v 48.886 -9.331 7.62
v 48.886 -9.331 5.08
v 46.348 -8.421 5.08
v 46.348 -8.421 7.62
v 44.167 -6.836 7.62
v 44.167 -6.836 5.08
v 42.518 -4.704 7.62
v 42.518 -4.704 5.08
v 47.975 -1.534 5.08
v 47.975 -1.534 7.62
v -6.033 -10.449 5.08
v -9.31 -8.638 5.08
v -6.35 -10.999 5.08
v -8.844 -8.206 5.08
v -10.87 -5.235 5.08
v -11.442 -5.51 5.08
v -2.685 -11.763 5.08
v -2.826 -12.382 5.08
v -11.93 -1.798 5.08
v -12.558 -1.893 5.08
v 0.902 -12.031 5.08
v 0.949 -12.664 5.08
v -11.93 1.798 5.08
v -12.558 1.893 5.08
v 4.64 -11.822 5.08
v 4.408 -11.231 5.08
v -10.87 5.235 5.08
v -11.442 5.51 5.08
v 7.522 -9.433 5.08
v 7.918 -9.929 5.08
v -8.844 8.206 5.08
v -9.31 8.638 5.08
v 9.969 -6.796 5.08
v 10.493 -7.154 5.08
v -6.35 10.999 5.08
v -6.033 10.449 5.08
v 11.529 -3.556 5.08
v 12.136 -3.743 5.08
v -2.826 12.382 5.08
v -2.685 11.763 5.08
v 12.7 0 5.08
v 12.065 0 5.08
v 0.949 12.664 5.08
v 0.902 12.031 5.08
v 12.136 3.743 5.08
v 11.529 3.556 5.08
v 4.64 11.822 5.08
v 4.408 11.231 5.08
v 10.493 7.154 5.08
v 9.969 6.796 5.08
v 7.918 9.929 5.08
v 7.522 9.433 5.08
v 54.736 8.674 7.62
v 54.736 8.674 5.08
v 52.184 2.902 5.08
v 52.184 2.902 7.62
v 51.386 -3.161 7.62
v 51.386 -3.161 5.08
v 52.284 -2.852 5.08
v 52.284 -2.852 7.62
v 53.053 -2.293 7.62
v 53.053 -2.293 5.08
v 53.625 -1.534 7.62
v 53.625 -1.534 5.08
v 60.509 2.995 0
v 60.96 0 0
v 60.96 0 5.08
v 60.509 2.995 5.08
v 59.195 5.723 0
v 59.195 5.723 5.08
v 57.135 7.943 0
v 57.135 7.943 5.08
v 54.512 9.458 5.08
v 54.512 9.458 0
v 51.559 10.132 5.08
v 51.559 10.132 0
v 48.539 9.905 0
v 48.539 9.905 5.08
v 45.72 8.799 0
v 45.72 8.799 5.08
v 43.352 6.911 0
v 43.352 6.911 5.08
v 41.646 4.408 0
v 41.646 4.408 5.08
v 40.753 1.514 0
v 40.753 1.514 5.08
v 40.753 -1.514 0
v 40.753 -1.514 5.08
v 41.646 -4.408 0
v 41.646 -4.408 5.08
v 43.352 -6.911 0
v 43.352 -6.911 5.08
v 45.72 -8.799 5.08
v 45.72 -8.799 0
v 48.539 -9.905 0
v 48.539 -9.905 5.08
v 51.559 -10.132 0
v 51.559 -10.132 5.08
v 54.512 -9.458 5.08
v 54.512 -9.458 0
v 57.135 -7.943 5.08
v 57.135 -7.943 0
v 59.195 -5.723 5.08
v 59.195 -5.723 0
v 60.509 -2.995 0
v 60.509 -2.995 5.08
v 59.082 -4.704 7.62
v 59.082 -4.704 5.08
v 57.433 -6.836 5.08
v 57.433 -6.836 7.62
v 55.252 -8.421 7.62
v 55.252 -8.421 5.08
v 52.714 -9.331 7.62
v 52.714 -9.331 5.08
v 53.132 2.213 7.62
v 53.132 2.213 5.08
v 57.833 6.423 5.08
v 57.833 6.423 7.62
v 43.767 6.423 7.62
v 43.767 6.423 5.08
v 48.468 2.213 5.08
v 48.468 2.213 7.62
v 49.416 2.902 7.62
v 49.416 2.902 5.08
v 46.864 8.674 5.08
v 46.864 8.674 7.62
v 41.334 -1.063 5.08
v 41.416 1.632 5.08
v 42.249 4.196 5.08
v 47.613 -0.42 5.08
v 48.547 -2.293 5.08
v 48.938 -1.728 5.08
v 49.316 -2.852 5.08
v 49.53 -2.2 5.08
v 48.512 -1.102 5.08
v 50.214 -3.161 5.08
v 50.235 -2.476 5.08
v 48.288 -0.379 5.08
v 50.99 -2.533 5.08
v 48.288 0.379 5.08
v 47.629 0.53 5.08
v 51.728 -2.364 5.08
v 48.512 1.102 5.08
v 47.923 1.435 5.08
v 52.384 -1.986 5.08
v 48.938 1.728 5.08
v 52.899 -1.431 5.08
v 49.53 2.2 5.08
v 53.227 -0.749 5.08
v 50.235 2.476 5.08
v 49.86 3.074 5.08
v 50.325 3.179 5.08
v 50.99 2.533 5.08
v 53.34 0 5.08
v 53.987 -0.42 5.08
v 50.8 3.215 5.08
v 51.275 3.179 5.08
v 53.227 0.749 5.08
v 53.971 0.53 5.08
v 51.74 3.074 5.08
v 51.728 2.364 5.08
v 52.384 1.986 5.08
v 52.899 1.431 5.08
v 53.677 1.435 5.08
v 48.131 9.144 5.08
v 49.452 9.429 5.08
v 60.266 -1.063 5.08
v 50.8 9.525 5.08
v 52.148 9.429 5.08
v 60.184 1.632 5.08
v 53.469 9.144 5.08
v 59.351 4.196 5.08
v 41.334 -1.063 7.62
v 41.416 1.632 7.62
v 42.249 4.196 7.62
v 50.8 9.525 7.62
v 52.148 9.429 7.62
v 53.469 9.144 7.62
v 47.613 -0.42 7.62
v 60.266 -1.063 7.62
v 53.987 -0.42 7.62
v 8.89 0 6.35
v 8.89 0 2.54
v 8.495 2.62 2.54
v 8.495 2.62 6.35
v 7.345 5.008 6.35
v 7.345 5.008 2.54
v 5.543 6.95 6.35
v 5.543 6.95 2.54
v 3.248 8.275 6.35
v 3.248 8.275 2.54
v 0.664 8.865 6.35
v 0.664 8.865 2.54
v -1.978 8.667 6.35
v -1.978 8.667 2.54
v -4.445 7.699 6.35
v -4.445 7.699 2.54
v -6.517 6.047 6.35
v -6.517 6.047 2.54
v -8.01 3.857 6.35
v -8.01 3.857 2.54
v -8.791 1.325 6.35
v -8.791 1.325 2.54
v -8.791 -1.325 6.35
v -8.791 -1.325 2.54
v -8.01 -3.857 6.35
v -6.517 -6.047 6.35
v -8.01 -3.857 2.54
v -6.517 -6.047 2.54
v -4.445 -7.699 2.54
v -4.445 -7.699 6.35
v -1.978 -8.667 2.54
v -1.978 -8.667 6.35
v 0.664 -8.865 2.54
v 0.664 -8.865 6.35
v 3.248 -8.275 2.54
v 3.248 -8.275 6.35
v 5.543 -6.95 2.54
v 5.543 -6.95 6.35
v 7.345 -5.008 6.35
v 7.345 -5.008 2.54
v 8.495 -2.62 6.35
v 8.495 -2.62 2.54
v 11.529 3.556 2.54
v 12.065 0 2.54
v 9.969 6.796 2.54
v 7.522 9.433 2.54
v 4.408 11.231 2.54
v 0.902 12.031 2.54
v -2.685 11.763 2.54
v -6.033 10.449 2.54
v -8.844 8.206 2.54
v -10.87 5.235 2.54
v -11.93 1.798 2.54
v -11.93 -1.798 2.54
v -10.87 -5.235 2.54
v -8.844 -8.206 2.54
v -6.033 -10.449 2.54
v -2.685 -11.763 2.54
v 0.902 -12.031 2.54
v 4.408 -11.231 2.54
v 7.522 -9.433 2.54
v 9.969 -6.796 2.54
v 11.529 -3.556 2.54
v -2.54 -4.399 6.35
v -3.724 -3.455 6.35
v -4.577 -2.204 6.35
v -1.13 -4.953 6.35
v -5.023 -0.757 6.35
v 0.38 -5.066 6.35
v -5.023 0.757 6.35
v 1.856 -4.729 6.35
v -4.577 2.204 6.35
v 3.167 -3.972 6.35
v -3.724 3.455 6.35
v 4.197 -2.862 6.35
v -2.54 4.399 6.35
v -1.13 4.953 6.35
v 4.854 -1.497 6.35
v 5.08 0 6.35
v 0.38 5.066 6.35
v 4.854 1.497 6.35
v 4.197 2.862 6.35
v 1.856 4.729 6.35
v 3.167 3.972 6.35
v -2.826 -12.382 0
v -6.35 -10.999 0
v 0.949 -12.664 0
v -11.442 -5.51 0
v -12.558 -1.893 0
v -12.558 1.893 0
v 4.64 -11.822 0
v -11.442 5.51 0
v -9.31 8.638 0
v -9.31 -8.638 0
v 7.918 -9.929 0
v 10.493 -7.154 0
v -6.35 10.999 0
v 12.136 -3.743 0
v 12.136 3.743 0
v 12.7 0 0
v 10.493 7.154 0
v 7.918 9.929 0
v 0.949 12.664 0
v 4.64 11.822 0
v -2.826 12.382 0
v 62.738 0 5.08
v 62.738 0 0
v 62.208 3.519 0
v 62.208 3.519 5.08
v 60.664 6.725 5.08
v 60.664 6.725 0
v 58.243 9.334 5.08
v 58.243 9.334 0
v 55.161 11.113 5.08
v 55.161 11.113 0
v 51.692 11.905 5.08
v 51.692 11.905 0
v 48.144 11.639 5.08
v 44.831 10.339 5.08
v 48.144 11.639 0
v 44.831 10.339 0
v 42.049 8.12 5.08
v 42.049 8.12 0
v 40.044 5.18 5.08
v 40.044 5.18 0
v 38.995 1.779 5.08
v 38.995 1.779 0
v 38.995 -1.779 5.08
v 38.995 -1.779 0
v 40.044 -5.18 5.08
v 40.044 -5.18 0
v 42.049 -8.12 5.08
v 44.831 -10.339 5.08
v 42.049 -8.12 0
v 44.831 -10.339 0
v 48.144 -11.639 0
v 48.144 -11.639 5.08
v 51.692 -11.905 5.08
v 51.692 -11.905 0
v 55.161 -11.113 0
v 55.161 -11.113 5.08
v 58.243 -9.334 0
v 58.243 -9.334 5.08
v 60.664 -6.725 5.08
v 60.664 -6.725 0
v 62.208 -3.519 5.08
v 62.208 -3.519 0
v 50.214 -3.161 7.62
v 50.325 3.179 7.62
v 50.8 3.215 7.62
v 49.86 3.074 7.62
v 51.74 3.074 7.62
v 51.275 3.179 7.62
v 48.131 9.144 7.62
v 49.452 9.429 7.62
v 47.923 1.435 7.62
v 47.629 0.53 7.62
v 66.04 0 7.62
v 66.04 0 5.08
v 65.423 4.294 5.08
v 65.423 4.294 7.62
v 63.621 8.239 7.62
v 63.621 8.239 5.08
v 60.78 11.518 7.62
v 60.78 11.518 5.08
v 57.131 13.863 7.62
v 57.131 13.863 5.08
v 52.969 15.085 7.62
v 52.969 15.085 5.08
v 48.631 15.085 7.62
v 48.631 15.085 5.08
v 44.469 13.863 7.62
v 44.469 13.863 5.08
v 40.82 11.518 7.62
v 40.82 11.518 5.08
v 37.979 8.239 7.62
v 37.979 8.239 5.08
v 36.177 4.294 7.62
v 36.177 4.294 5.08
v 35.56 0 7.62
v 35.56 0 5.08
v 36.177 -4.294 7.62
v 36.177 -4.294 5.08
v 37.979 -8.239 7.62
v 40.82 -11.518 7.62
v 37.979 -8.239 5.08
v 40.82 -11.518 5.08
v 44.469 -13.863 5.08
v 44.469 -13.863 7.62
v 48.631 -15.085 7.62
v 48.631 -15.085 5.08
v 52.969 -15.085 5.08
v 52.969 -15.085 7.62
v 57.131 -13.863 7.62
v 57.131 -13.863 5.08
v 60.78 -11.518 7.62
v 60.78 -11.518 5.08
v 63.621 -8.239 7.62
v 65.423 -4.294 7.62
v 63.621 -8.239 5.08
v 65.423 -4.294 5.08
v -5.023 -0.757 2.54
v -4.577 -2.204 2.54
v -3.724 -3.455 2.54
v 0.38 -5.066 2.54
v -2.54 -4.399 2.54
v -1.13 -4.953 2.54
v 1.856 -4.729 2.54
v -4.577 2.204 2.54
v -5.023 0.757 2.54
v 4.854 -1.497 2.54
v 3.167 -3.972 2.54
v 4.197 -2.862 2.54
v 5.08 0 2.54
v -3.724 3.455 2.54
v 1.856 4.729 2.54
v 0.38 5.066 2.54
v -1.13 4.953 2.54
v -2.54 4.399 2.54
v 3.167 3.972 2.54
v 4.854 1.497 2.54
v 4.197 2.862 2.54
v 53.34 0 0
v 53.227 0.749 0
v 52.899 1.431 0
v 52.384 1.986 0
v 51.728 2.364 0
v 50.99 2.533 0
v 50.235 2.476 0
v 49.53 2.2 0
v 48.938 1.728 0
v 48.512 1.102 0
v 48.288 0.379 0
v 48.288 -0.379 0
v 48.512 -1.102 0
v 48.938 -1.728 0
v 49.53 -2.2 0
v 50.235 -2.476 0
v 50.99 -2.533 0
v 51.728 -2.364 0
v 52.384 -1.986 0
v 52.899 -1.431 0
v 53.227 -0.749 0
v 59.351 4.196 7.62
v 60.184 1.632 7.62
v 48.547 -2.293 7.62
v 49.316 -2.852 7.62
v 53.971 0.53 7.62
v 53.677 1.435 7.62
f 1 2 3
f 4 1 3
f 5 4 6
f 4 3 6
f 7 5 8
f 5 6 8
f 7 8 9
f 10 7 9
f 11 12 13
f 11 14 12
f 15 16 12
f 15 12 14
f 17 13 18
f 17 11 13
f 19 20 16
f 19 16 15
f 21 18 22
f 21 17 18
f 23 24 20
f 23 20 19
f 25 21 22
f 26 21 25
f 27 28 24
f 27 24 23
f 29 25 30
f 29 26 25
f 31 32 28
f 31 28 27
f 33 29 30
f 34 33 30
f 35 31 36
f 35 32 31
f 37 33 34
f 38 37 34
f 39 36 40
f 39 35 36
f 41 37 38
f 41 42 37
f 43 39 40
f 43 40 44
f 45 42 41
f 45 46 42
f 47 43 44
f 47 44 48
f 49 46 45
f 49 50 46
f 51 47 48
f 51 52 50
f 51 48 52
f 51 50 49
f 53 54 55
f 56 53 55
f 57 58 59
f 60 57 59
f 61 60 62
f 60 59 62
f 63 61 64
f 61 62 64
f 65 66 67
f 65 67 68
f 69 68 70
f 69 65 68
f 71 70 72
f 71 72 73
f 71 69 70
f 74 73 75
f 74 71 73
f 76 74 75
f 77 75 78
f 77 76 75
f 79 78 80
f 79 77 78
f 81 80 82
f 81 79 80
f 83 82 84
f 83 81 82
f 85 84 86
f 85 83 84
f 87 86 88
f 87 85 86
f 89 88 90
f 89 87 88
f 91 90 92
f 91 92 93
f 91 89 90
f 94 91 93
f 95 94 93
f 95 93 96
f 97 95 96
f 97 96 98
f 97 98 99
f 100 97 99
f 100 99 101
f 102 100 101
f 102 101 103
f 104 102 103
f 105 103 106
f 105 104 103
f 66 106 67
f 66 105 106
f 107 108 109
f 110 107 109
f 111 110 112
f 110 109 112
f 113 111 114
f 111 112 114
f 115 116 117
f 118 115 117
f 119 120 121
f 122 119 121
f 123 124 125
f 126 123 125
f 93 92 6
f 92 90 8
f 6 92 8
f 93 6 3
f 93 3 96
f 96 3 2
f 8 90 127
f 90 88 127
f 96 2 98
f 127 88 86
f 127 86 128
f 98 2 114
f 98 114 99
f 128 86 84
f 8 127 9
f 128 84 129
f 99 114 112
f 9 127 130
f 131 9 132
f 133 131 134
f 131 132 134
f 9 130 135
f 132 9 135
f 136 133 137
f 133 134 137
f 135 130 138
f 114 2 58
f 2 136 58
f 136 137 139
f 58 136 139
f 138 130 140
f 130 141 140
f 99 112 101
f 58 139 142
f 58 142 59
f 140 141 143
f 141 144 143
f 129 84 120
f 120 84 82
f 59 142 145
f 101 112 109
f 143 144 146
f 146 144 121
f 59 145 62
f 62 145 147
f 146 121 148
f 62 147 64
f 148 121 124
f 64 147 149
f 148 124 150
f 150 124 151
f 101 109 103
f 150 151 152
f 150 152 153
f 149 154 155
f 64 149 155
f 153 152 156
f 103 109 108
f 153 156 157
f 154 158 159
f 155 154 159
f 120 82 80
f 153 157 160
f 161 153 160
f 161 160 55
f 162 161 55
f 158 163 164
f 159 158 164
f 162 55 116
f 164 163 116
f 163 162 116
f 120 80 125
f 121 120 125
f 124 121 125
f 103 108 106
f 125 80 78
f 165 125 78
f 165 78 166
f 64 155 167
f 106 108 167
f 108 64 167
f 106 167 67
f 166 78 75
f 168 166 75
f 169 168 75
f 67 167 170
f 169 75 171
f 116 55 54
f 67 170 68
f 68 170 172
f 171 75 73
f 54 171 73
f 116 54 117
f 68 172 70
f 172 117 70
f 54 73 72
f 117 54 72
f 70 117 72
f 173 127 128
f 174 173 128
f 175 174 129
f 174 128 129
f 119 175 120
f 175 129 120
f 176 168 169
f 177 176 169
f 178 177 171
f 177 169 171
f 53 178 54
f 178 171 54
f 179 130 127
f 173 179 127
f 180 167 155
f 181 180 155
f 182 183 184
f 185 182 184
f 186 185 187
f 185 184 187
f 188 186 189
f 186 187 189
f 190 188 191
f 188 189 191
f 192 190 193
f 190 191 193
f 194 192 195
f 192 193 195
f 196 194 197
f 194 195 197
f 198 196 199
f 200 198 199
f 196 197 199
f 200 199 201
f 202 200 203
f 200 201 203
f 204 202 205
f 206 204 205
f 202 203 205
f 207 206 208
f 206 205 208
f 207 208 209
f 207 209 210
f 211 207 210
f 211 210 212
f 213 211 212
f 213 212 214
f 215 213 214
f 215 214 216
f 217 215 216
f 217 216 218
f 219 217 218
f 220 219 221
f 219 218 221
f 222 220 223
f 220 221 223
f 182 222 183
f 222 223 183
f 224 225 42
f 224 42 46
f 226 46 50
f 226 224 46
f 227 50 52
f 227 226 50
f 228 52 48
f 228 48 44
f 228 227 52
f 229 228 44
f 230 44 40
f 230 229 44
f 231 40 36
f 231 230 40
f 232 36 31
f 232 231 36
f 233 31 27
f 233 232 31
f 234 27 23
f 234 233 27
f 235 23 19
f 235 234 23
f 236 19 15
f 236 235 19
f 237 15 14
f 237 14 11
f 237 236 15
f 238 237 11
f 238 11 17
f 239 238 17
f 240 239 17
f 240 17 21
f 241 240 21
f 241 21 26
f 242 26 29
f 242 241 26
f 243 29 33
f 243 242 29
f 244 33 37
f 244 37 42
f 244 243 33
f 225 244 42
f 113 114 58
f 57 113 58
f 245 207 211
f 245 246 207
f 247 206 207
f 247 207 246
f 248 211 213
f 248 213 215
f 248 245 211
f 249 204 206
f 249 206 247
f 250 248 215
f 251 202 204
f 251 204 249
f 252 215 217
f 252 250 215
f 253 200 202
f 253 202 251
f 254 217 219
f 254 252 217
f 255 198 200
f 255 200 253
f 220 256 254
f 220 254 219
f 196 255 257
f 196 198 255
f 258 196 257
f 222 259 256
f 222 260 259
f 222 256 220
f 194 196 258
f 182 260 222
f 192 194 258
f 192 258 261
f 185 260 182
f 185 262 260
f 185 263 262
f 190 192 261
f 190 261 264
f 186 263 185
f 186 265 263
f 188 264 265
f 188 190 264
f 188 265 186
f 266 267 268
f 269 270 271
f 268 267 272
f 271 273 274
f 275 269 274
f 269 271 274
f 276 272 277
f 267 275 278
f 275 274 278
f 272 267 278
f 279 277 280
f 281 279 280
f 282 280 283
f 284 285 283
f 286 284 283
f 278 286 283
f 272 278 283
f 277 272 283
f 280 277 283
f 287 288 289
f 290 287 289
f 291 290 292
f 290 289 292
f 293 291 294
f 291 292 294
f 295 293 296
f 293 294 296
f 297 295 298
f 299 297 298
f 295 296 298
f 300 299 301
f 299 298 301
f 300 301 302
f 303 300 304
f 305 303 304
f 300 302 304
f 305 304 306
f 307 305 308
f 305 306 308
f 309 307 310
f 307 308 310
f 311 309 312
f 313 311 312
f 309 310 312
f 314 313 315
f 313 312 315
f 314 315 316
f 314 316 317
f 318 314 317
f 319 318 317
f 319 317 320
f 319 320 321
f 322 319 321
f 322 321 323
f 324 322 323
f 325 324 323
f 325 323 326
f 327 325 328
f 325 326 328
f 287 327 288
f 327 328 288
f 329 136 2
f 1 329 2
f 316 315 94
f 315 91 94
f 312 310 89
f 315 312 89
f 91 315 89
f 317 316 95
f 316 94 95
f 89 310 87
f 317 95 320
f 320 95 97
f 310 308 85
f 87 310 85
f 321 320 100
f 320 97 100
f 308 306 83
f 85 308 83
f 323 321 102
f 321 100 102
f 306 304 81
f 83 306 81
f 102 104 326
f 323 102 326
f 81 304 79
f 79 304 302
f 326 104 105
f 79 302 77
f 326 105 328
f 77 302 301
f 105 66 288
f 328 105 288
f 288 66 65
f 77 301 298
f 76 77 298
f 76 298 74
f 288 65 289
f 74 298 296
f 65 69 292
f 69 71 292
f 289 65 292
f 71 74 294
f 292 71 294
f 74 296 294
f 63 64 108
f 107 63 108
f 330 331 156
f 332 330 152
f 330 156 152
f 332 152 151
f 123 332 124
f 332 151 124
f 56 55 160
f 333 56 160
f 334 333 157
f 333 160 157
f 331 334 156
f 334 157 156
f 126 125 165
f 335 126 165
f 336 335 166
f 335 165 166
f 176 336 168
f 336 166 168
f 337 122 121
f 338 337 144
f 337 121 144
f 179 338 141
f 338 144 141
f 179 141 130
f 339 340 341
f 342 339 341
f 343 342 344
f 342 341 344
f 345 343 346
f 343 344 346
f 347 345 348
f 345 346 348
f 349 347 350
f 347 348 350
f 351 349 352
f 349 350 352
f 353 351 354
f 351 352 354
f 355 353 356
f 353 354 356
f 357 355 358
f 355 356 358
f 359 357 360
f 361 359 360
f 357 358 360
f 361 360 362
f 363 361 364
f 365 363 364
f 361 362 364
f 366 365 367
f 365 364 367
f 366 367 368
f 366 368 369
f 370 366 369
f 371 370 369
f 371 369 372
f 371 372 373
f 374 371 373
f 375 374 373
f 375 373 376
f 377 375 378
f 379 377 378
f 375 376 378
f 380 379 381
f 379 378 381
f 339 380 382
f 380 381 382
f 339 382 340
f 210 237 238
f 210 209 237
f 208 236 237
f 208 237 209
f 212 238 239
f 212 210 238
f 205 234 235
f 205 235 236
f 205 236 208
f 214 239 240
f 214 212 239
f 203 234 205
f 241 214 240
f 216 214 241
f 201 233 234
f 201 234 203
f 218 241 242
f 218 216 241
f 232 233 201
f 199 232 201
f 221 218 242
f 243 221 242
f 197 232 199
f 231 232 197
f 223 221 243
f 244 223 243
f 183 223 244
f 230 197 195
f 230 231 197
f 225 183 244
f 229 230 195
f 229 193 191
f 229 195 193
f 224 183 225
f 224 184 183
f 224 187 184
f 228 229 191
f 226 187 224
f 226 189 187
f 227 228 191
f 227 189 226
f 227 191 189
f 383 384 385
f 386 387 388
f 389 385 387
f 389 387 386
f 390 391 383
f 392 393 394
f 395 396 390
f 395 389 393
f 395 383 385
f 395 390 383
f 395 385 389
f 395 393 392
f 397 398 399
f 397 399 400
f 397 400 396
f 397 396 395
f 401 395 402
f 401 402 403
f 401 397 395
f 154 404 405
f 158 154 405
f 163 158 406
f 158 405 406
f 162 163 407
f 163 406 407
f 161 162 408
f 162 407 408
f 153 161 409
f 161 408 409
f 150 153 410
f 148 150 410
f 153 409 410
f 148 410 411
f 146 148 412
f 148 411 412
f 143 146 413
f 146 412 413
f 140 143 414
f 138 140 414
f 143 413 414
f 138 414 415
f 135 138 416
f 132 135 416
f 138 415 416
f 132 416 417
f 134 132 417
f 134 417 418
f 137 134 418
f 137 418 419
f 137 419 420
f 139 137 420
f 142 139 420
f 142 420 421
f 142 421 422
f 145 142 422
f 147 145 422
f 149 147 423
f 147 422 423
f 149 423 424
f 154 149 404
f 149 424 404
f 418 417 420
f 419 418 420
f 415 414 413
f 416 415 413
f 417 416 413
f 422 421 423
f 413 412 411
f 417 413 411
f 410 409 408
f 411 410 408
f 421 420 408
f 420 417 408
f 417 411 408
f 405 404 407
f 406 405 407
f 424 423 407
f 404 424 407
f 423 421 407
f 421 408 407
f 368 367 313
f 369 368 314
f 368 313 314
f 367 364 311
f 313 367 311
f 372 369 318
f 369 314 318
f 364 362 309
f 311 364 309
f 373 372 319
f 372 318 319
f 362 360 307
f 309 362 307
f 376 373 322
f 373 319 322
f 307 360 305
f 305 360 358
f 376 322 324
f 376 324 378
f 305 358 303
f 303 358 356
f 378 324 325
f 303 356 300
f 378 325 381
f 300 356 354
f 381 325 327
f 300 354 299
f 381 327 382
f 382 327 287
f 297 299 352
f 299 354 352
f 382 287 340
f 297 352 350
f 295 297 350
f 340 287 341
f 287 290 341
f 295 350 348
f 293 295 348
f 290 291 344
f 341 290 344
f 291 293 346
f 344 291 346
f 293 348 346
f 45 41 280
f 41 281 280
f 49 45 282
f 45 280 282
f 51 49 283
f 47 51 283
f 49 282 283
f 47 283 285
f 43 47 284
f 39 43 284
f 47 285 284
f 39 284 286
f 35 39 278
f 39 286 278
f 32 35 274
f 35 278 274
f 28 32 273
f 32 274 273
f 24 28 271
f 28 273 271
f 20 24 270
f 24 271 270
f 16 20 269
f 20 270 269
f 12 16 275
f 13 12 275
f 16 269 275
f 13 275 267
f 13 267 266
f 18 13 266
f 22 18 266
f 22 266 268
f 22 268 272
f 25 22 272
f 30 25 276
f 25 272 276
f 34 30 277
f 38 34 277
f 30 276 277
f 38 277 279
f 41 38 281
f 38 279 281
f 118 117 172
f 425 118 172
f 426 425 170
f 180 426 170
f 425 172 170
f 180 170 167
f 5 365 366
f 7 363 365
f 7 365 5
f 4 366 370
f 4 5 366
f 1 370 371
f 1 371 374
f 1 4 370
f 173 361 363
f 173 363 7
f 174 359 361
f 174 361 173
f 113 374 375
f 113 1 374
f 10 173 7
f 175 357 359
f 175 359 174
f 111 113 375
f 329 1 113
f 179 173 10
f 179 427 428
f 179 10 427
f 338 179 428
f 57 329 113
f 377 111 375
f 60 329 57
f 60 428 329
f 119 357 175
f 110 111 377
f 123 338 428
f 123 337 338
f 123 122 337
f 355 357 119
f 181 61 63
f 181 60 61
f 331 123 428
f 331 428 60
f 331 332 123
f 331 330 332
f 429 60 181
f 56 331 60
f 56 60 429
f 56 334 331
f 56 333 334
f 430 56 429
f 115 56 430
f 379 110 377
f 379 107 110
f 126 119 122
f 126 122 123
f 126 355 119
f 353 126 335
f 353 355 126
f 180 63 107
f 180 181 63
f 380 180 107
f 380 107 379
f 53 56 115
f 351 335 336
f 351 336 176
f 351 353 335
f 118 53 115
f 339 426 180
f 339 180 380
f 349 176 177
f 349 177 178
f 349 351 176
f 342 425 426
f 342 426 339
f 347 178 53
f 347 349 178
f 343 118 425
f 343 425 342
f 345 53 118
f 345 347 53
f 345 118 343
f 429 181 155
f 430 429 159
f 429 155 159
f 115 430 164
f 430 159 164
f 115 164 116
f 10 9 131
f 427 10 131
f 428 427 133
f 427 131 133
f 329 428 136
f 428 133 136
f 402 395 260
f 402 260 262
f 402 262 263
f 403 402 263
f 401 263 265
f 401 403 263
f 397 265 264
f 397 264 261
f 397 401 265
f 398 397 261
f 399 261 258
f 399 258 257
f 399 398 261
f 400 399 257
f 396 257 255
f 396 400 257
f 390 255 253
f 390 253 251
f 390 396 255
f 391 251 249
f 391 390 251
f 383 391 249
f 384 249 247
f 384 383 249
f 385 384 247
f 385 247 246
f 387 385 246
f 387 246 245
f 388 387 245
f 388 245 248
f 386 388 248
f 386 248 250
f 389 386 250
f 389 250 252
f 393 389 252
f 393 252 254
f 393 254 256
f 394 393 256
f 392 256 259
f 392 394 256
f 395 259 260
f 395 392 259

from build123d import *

# Parameters (mm, degrees)
F0_R      = 12.7
F0_R_2    = 5.715
F1_DEPTH  = 2.54
F2_R      = 8.89
F2_R_2    = 5.08
F3_DEPTH  = 3.81
F4_R      = 12.7
F4_R_2    = 12.065
F5_DEPTH  = 2.54
F6_R      = 11.938
F6_R_2    = 10.16
F6_R_3    = 2.54
F7_DEPTH  = 5.08
F8_R      = 15.24
F9_DEPTH  = 2.54
F12_DEPTH = 25.4


with BuildPart() as f1:
    # F0 (on Top) → F1 (new body)
    with BuildSketch(Plane.XY):
        Circle(F0_R)
        Circle(F0_R_2, mode=Mode.SUBTRACT)
        Circle(F0_R_2)
    extrude(amount=F1_DEPTH)

    # F2 (on face) → F3 (join)
    with BuildSketch(Plane.XY.offset(2.54)):
        Circle(F2_R)
        Circle(F2_R_2, mode=Mode.SUBTRACT)
    extrude(amount=F3_DEPTH)

    # F4 (on face) → F5 (join)
    with BuildSketch(Plane.XY.offset(2.54)):
        Circle(F4_R)
        Circle(F4_R_2, mode=Mode.SUBTRACT)
    extrude(amount=F5_DEPTH)


with BuildPart() as f7:
    # F6 (on Top) → F7 (new body)
    with BuildSketch(Plane.XY):
        with Locations((50.8, 0)):
            Circle(F6_R)
        with Locations((50.8, 0)):
            Circle(F6_R_2, mode=Mode.SUBTRACT)
        with Locations((50.8, 0)):
            Circle(F6_R_3)
    extrude(amount=F7_DEPTH)


with BuildPart() as f9:
    # F8 (on face) → F9 (new body)
    with BuildSketch(Plane.XY.offset(5.08)):
        with Locations((50.8, 0)):
            Circle(F8_R)
    extrude(amount=F9_DEPTH)

    # F10: union F7
    add(f7.part)

    # F11 (on face) → F12 (cut)
    with BuildSketch(Plane(origin=(0, 0, 5.08), x_dir=(1, 0, 0), z_dir=(0, 0, -1))):
        with BuildLine():
            ThreePointArc((50.8, -3.214814), (50.090354, -3.135512), (49.415719, -2.901516))
            Line((49.415719, -2.901516), (46.864321, -8.673872))
            ThreePointArc((46.864321, -8.673872), (48.78667, -9.309787), (50.8, -9.525))
            Line((50.8, -9.525), (50.8, -3.214814))
        make_face()
        with BuildLine():
            ThreePointArc((52.184281, -2.901516), (51.509646, -3.135512), (50.8, -3.214814))
            Line((50.8, -3.214814), (50.8, -9.525))
            ThreePointArc((50.8, -9.525), (52.81333, -9.309787), (54.735679, -8.673872))
            Line((54.735679, -8.673872), (52.184281, -2.901516))
        make_face()
        with BuildLine():
            Line((60.265534, 1.06268), (53.987272, 0.419912))
            ThreePointArc((53.987272, 0.419912), (53.85747, -0.993432), (53.13174, -2.213148))
            Line((53.13174, -2.213148), (57.83315, -6.423427))
            ThreePointArc((57.83315, -6.423427), (59.858813, -2.943387), (60.265534, 1.06268))
        make_face()
        with BuildLine():
            Line((52.714342, 9.330644), (51.385561, 3.161036))
            ThreePointArc((51.385561, 3.161036), (52.68962, 2.600839), (53.625376, 1.533716))
            Line((53.625376, 1.533716), (59.082406, 4.703975))
            ThreePointArc((59.082406, 4.703975), (56.398655, 7.705887), (52.714342, 9.330644))
        make_face()
        with BuildLine():
            Line((42.517594, 4.703975), (47.974624, 1.533716))
            ThreePointArc((47.974624, 1.533716), (48.91038, 2.600839), (50.214439, 3.161036))
            Line((50.214439, 3.161036), (48.885658, 9.330644))
            ThreePointArc((48.885658, 9.330644), (45.201345, 7.705887), (42.517594, 4.703975))
        make_face()
        with BuildLine():
            Line((43.76685, -6.423427), (48.46826, -2.213148))
            ThreePointArc((48.46826, -2.213148), (47.74253, -0.993432), (47.612728, 0.419912))
            Line((47.612728, 0.419912), (41.334466, 1.06268))
            ThreePointArc((41.334466, 1.06268), (41.741187, -2.943387), (43.76685, -6.423427))
        make_face()
    extrude(amount=-F12_DEPTH, mode=Mode.SUBTRACT)


solid = Compound([f1.part, f9.part])
